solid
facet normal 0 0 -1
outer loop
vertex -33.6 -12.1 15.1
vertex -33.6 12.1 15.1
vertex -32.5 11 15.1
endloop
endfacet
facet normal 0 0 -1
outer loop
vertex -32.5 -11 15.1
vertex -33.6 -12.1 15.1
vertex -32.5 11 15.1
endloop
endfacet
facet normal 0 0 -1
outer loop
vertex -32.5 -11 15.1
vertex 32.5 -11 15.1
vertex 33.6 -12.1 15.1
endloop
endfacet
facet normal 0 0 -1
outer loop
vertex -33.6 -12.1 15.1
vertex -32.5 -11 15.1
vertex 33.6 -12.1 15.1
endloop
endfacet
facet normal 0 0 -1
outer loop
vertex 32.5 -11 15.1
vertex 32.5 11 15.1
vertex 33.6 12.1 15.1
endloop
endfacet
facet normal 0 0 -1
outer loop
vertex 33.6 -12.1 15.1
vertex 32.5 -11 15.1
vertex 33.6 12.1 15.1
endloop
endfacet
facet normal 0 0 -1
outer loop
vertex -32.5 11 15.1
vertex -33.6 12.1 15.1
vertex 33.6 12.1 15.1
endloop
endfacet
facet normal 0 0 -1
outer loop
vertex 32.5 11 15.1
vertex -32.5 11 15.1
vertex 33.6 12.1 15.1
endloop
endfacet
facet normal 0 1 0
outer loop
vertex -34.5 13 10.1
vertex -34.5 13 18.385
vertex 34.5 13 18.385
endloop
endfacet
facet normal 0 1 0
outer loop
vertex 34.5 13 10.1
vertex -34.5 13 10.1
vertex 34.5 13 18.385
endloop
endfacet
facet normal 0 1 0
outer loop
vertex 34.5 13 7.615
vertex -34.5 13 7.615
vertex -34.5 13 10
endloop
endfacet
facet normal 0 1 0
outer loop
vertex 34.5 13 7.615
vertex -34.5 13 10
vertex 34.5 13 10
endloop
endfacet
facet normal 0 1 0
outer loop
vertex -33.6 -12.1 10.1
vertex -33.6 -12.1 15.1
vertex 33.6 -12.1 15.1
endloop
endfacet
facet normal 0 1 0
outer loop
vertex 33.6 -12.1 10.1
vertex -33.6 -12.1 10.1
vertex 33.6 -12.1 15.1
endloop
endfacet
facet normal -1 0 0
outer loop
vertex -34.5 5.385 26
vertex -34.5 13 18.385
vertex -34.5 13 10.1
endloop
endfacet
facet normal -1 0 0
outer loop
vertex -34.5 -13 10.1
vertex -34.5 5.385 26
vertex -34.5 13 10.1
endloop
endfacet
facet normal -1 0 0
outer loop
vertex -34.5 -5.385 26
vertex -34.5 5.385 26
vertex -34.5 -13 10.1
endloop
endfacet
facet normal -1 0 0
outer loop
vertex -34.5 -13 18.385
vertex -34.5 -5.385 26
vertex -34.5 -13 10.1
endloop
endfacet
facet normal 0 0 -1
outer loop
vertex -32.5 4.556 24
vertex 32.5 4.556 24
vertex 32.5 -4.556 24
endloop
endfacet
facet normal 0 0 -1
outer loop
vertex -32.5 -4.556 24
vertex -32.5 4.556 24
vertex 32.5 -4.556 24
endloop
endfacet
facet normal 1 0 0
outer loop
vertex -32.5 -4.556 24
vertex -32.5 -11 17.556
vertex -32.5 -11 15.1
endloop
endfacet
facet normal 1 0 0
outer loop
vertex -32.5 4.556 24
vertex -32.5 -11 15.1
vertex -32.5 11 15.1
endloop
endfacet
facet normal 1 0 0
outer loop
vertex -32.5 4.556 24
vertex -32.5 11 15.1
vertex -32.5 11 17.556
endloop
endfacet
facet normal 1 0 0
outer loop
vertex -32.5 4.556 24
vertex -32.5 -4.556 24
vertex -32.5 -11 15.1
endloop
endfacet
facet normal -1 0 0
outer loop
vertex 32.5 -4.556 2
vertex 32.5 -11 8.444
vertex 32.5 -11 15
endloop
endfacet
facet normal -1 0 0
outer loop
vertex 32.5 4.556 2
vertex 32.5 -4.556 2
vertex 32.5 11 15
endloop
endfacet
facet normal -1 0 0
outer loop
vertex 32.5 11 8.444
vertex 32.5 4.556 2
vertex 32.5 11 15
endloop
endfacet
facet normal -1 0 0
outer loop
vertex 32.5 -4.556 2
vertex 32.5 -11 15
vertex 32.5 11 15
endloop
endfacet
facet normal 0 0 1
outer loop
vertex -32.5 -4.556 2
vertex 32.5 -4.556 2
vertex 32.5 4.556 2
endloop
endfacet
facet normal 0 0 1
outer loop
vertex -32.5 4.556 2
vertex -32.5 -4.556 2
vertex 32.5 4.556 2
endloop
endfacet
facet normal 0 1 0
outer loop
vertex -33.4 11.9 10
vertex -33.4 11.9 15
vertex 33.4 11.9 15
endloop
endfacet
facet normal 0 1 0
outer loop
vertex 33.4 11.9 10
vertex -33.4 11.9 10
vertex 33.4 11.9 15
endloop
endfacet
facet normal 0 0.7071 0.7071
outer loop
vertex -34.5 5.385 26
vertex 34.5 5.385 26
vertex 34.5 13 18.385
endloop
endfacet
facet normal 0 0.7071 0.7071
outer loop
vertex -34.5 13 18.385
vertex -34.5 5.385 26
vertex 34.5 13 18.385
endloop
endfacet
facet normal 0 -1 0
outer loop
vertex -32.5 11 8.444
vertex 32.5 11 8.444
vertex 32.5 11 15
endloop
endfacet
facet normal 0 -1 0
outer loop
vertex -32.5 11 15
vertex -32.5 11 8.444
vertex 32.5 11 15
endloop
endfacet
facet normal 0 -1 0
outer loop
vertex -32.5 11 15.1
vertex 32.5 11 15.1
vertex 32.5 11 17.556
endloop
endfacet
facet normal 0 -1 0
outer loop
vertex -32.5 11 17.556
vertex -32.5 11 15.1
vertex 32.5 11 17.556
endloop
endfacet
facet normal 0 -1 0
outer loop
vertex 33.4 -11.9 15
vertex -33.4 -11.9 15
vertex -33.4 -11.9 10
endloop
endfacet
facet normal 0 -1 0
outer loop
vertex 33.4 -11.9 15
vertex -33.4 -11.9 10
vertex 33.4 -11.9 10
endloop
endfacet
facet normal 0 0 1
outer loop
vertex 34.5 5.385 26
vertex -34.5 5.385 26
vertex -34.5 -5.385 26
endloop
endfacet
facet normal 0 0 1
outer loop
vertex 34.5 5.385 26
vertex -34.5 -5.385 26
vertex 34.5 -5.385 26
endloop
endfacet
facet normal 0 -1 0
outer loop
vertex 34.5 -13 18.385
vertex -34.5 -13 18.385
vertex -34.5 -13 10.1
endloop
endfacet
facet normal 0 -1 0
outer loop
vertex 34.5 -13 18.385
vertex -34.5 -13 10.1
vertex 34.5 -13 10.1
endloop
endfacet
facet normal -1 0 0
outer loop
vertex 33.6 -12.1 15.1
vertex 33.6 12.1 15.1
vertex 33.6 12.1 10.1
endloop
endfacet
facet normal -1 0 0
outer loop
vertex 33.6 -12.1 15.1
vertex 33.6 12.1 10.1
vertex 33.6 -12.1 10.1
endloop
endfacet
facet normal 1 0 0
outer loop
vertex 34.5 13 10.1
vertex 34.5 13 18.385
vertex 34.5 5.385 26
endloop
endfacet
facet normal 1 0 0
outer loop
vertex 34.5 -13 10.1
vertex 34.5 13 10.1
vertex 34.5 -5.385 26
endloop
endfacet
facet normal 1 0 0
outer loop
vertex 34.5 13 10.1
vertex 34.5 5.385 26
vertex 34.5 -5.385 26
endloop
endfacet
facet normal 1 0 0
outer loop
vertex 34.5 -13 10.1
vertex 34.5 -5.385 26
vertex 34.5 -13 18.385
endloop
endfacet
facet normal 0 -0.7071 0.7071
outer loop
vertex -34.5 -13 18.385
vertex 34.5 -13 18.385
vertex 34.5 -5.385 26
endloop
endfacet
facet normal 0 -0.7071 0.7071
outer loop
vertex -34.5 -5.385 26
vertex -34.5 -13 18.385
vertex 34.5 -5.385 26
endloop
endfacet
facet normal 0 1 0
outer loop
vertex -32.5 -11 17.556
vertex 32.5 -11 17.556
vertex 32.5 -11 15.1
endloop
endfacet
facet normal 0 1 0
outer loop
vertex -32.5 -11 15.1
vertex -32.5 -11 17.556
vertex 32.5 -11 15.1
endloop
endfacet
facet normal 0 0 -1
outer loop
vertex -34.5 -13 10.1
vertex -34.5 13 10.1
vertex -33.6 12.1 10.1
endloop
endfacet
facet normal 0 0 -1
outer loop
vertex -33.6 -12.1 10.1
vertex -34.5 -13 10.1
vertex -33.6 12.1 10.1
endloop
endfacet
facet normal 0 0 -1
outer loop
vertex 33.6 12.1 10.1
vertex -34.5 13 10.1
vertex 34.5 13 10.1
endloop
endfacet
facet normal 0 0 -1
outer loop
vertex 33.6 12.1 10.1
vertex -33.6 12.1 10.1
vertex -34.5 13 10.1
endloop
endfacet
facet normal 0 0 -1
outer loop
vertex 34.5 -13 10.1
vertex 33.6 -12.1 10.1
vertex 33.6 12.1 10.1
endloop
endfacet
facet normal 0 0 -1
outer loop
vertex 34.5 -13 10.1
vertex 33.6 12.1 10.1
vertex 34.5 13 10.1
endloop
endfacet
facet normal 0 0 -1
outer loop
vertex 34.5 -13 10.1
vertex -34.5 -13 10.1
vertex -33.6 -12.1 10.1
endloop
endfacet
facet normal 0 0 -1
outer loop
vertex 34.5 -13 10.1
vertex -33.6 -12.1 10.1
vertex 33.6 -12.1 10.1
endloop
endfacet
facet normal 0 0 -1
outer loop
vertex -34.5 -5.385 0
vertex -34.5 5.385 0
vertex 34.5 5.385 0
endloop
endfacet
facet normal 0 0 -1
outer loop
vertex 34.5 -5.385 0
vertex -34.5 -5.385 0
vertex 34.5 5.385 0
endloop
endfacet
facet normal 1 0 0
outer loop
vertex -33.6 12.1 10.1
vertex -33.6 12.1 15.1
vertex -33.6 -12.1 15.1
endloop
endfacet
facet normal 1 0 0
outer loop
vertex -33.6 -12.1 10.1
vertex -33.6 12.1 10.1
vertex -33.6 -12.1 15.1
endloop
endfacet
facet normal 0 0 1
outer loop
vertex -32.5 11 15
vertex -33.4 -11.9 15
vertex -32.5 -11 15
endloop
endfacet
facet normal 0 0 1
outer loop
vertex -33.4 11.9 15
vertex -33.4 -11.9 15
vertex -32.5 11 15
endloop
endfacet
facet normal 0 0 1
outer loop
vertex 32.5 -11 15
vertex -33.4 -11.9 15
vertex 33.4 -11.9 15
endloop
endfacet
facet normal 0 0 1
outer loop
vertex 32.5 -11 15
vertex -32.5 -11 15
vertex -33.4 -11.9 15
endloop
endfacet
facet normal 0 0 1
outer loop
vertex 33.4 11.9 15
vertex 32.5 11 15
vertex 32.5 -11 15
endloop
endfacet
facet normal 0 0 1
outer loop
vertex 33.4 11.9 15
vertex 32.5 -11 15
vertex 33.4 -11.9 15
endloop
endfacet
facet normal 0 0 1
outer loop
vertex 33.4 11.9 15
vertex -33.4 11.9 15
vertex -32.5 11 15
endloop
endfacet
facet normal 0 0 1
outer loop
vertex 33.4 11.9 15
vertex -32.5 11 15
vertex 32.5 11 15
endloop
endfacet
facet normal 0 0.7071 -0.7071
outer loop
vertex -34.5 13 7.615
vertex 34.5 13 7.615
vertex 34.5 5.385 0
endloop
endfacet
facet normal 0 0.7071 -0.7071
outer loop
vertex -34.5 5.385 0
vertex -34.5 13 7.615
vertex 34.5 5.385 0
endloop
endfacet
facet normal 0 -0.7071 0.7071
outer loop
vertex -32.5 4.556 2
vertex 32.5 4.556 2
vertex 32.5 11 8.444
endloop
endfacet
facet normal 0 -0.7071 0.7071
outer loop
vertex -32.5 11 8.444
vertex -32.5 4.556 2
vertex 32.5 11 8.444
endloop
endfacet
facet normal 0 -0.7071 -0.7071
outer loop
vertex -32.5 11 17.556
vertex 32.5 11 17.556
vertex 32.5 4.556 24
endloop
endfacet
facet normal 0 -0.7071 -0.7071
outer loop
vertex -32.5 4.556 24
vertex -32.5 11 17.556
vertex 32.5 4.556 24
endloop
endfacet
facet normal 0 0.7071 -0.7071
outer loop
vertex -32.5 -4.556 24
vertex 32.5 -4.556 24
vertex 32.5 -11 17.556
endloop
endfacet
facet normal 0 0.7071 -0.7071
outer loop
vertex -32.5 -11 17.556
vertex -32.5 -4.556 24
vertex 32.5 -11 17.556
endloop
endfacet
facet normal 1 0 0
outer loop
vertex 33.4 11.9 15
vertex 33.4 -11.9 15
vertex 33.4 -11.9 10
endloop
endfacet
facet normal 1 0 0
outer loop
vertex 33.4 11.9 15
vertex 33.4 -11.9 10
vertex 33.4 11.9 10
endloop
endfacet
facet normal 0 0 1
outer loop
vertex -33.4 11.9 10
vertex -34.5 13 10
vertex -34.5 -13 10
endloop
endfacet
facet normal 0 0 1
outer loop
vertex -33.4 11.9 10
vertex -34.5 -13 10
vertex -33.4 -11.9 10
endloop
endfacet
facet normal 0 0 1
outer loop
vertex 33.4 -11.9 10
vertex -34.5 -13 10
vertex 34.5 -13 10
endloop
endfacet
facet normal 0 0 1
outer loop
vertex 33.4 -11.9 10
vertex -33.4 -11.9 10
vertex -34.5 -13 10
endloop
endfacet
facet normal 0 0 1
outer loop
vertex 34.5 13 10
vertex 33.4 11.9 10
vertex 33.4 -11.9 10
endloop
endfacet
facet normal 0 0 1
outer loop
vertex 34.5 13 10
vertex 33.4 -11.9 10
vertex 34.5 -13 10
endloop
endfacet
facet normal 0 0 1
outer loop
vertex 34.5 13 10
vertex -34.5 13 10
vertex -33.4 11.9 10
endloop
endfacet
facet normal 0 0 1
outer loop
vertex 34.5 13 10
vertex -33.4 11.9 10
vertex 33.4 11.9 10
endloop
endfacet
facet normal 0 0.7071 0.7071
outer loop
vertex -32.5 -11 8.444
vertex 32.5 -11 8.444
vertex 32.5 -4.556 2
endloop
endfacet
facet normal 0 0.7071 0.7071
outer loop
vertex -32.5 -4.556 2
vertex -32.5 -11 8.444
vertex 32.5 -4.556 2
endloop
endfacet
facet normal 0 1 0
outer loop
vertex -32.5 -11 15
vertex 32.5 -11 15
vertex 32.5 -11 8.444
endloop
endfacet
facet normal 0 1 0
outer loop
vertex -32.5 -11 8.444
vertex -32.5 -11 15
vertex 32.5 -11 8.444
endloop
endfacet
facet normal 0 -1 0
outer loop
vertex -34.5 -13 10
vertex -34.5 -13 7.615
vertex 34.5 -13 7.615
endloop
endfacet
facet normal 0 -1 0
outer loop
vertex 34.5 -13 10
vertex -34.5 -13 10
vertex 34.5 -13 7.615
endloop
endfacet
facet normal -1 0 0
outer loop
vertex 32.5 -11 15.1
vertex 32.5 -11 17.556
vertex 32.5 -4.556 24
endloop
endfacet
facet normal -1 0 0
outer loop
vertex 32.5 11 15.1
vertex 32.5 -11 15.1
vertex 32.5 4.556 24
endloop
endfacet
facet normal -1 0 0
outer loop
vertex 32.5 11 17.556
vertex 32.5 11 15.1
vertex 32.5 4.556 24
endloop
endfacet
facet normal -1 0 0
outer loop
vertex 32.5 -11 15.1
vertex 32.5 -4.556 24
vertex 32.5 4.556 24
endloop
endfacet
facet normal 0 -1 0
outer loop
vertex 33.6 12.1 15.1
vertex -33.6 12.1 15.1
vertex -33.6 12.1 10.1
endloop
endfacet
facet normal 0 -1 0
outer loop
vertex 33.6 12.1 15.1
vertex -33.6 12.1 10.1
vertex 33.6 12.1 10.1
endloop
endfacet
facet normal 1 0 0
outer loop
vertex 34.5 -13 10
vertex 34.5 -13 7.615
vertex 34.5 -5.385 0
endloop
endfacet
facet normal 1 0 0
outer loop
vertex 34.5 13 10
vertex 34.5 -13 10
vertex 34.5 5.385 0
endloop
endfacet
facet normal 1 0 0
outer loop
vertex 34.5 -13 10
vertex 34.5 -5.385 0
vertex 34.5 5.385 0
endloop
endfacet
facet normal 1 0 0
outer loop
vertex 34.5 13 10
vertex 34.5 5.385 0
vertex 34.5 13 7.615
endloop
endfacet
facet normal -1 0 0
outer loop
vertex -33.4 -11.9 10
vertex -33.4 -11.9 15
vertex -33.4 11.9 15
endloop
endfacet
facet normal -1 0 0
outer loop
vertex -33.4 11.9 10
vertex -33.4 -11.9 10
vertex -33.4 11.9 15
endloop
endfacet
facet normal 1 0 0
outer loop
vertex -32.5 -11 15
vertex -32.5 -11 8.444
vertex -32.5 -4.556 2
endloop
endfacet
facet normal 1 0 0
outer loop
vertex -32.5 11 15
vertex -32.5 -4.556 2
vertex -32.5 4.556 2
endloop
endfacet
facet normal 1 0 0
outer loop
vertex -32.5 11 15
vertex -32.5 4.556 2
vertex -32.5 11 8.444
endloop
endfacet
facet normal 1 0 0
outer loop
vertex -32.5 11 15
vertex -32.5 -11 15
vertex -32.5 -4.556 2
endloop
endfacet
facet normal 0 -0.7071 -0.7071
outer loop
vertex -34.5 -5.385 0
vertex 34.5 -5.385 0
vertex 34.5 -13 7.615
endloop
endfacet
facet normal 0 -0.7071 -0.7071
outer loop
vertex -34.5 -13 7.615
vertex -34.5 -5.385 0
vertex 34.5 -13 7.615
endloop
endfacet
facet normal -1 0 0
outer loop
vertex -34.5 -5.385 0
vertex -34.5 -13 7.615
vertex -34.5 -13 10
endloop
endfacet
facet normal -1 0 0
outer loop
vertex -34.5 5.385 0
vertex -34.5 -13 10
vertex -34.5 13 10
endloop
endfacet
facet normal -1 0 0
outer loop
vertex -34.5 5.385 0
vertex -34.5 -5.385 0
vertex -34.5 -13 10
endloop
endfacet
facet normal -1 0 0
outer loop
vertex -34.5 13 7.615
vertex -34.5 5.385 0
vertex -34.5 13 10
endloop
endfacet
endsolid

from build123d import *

# Parameters (mm, degrees)
F0_W      = 69
F0_H      = 26
F1_DEPTH  = 15
F4_DEPTH  = 65
F5_W      = 69
F5_H      = 26
F5_W_2    = 66.8
F5_H_2    = 23.8
F6_DEPTH  = 5
F8_W      = 69
F8_H      = 26
F9_DEPTH  = 10.9
F10_W     = 69
F10_H     = 26
F10_W_2   = 67.2
F10_H_2   = 24.2
F11_DEPTH = 5
F13_DEPTH = 65
F15_DEPTH = 69.001
F17_DEPTH = 69.001


with BuildPart() as f1:
    # F0 (on Top) → F1 (new body)
    with BuildSketch(Plane.XY):
        Rectangle(F0_W, F0_H)
    extrude(amount=F1_DEPTH)

    # F3 (on offset) → F4 (cut)
    with BuildSketch(Plane.YZ.offset(32.5)):
        Polygon((11, 15), (-11, 15), (-11, 8.4436508139), (-4.5563491861, 2), (4.5563491861, 2), (11, 8.4436508139), align=None)
    extrude(amount=-F4_DEPTH, mode=Mode.SUBTRACT)

    # F5 (on face) → F6 (cut)
    with BuildSketch(Plane.XY.offset(15)):
        Rectangle(F5_W, F5_H)
        Rectangle(F5_W_2, F5_H_2, mode=Mode.SUBTRACT)
    extrude(amount=-F6_DEPTH, mode=Mode.SUBTRACT)

    # F14 (on face) → F15 (cut, through all)
    with BuildSketch(Plane.YZ.offset(34.5)):
        Polygon((5.3847763109, 0), (13, 0), (13, 7.6152236891), align=None)
        Polygon((-5.3847763109, 0), (-13, 7.6152236891), (-13, 0), align=None)
    extrude(amount=-F15_DEPTH, mode=Mode.SUBTRACT)


with BuildPart() as f9:
    # F8 (on offset) → F9 (new body)
    with BuildSketch(Plane.XY.offset(15.1)):
        Rectangle(F8_W, F8_H)
    extrude(amount=F9_DEPTH)

    # F10 (on face) → F11 (join)
    with BuildSketch(Plane(origin=(0, 0, 15.1), x_dir=(1, 0, 0), z_dir=(0, 0, -1))):
        Rectangle(F10_W, F10_H)
        Rectangle(F10_W_2, F10_H_2, mode=Mode.SUBTRACT)
    extrude(amount=F11_DEPTH)

    # F12 (on offset) → F13 (cut)
    with BuildSketch(Plane.YZ.offset(32.5)):
        Polygon((4.5563491861, 24), (-4.5563491861, 24), (-11, 17.5563491861), (-11, 8.4436508139), (11, 8.4436508139), (11, 17.5563491861), align=None)
    extrude(amount=-F13_DEPTH, mode=Mode.SUBTRACT)

    # F16 (on face) → F17 (cut, through all)
    with BuildSketch(Plane.YZ.offset(34.5)):
        Polygon((-13, 26), (-13, 18.3847763109), (-5.3847763109, 26), align=None)
        Polygon((5.3847763109, 26), (13, 18.3847763109), (13, 26), align=None)
    extrude(amount=-F17_DEPTH, mode=Mode.SUBTRACT)


solid = Compound([f1.part, f9.part])
